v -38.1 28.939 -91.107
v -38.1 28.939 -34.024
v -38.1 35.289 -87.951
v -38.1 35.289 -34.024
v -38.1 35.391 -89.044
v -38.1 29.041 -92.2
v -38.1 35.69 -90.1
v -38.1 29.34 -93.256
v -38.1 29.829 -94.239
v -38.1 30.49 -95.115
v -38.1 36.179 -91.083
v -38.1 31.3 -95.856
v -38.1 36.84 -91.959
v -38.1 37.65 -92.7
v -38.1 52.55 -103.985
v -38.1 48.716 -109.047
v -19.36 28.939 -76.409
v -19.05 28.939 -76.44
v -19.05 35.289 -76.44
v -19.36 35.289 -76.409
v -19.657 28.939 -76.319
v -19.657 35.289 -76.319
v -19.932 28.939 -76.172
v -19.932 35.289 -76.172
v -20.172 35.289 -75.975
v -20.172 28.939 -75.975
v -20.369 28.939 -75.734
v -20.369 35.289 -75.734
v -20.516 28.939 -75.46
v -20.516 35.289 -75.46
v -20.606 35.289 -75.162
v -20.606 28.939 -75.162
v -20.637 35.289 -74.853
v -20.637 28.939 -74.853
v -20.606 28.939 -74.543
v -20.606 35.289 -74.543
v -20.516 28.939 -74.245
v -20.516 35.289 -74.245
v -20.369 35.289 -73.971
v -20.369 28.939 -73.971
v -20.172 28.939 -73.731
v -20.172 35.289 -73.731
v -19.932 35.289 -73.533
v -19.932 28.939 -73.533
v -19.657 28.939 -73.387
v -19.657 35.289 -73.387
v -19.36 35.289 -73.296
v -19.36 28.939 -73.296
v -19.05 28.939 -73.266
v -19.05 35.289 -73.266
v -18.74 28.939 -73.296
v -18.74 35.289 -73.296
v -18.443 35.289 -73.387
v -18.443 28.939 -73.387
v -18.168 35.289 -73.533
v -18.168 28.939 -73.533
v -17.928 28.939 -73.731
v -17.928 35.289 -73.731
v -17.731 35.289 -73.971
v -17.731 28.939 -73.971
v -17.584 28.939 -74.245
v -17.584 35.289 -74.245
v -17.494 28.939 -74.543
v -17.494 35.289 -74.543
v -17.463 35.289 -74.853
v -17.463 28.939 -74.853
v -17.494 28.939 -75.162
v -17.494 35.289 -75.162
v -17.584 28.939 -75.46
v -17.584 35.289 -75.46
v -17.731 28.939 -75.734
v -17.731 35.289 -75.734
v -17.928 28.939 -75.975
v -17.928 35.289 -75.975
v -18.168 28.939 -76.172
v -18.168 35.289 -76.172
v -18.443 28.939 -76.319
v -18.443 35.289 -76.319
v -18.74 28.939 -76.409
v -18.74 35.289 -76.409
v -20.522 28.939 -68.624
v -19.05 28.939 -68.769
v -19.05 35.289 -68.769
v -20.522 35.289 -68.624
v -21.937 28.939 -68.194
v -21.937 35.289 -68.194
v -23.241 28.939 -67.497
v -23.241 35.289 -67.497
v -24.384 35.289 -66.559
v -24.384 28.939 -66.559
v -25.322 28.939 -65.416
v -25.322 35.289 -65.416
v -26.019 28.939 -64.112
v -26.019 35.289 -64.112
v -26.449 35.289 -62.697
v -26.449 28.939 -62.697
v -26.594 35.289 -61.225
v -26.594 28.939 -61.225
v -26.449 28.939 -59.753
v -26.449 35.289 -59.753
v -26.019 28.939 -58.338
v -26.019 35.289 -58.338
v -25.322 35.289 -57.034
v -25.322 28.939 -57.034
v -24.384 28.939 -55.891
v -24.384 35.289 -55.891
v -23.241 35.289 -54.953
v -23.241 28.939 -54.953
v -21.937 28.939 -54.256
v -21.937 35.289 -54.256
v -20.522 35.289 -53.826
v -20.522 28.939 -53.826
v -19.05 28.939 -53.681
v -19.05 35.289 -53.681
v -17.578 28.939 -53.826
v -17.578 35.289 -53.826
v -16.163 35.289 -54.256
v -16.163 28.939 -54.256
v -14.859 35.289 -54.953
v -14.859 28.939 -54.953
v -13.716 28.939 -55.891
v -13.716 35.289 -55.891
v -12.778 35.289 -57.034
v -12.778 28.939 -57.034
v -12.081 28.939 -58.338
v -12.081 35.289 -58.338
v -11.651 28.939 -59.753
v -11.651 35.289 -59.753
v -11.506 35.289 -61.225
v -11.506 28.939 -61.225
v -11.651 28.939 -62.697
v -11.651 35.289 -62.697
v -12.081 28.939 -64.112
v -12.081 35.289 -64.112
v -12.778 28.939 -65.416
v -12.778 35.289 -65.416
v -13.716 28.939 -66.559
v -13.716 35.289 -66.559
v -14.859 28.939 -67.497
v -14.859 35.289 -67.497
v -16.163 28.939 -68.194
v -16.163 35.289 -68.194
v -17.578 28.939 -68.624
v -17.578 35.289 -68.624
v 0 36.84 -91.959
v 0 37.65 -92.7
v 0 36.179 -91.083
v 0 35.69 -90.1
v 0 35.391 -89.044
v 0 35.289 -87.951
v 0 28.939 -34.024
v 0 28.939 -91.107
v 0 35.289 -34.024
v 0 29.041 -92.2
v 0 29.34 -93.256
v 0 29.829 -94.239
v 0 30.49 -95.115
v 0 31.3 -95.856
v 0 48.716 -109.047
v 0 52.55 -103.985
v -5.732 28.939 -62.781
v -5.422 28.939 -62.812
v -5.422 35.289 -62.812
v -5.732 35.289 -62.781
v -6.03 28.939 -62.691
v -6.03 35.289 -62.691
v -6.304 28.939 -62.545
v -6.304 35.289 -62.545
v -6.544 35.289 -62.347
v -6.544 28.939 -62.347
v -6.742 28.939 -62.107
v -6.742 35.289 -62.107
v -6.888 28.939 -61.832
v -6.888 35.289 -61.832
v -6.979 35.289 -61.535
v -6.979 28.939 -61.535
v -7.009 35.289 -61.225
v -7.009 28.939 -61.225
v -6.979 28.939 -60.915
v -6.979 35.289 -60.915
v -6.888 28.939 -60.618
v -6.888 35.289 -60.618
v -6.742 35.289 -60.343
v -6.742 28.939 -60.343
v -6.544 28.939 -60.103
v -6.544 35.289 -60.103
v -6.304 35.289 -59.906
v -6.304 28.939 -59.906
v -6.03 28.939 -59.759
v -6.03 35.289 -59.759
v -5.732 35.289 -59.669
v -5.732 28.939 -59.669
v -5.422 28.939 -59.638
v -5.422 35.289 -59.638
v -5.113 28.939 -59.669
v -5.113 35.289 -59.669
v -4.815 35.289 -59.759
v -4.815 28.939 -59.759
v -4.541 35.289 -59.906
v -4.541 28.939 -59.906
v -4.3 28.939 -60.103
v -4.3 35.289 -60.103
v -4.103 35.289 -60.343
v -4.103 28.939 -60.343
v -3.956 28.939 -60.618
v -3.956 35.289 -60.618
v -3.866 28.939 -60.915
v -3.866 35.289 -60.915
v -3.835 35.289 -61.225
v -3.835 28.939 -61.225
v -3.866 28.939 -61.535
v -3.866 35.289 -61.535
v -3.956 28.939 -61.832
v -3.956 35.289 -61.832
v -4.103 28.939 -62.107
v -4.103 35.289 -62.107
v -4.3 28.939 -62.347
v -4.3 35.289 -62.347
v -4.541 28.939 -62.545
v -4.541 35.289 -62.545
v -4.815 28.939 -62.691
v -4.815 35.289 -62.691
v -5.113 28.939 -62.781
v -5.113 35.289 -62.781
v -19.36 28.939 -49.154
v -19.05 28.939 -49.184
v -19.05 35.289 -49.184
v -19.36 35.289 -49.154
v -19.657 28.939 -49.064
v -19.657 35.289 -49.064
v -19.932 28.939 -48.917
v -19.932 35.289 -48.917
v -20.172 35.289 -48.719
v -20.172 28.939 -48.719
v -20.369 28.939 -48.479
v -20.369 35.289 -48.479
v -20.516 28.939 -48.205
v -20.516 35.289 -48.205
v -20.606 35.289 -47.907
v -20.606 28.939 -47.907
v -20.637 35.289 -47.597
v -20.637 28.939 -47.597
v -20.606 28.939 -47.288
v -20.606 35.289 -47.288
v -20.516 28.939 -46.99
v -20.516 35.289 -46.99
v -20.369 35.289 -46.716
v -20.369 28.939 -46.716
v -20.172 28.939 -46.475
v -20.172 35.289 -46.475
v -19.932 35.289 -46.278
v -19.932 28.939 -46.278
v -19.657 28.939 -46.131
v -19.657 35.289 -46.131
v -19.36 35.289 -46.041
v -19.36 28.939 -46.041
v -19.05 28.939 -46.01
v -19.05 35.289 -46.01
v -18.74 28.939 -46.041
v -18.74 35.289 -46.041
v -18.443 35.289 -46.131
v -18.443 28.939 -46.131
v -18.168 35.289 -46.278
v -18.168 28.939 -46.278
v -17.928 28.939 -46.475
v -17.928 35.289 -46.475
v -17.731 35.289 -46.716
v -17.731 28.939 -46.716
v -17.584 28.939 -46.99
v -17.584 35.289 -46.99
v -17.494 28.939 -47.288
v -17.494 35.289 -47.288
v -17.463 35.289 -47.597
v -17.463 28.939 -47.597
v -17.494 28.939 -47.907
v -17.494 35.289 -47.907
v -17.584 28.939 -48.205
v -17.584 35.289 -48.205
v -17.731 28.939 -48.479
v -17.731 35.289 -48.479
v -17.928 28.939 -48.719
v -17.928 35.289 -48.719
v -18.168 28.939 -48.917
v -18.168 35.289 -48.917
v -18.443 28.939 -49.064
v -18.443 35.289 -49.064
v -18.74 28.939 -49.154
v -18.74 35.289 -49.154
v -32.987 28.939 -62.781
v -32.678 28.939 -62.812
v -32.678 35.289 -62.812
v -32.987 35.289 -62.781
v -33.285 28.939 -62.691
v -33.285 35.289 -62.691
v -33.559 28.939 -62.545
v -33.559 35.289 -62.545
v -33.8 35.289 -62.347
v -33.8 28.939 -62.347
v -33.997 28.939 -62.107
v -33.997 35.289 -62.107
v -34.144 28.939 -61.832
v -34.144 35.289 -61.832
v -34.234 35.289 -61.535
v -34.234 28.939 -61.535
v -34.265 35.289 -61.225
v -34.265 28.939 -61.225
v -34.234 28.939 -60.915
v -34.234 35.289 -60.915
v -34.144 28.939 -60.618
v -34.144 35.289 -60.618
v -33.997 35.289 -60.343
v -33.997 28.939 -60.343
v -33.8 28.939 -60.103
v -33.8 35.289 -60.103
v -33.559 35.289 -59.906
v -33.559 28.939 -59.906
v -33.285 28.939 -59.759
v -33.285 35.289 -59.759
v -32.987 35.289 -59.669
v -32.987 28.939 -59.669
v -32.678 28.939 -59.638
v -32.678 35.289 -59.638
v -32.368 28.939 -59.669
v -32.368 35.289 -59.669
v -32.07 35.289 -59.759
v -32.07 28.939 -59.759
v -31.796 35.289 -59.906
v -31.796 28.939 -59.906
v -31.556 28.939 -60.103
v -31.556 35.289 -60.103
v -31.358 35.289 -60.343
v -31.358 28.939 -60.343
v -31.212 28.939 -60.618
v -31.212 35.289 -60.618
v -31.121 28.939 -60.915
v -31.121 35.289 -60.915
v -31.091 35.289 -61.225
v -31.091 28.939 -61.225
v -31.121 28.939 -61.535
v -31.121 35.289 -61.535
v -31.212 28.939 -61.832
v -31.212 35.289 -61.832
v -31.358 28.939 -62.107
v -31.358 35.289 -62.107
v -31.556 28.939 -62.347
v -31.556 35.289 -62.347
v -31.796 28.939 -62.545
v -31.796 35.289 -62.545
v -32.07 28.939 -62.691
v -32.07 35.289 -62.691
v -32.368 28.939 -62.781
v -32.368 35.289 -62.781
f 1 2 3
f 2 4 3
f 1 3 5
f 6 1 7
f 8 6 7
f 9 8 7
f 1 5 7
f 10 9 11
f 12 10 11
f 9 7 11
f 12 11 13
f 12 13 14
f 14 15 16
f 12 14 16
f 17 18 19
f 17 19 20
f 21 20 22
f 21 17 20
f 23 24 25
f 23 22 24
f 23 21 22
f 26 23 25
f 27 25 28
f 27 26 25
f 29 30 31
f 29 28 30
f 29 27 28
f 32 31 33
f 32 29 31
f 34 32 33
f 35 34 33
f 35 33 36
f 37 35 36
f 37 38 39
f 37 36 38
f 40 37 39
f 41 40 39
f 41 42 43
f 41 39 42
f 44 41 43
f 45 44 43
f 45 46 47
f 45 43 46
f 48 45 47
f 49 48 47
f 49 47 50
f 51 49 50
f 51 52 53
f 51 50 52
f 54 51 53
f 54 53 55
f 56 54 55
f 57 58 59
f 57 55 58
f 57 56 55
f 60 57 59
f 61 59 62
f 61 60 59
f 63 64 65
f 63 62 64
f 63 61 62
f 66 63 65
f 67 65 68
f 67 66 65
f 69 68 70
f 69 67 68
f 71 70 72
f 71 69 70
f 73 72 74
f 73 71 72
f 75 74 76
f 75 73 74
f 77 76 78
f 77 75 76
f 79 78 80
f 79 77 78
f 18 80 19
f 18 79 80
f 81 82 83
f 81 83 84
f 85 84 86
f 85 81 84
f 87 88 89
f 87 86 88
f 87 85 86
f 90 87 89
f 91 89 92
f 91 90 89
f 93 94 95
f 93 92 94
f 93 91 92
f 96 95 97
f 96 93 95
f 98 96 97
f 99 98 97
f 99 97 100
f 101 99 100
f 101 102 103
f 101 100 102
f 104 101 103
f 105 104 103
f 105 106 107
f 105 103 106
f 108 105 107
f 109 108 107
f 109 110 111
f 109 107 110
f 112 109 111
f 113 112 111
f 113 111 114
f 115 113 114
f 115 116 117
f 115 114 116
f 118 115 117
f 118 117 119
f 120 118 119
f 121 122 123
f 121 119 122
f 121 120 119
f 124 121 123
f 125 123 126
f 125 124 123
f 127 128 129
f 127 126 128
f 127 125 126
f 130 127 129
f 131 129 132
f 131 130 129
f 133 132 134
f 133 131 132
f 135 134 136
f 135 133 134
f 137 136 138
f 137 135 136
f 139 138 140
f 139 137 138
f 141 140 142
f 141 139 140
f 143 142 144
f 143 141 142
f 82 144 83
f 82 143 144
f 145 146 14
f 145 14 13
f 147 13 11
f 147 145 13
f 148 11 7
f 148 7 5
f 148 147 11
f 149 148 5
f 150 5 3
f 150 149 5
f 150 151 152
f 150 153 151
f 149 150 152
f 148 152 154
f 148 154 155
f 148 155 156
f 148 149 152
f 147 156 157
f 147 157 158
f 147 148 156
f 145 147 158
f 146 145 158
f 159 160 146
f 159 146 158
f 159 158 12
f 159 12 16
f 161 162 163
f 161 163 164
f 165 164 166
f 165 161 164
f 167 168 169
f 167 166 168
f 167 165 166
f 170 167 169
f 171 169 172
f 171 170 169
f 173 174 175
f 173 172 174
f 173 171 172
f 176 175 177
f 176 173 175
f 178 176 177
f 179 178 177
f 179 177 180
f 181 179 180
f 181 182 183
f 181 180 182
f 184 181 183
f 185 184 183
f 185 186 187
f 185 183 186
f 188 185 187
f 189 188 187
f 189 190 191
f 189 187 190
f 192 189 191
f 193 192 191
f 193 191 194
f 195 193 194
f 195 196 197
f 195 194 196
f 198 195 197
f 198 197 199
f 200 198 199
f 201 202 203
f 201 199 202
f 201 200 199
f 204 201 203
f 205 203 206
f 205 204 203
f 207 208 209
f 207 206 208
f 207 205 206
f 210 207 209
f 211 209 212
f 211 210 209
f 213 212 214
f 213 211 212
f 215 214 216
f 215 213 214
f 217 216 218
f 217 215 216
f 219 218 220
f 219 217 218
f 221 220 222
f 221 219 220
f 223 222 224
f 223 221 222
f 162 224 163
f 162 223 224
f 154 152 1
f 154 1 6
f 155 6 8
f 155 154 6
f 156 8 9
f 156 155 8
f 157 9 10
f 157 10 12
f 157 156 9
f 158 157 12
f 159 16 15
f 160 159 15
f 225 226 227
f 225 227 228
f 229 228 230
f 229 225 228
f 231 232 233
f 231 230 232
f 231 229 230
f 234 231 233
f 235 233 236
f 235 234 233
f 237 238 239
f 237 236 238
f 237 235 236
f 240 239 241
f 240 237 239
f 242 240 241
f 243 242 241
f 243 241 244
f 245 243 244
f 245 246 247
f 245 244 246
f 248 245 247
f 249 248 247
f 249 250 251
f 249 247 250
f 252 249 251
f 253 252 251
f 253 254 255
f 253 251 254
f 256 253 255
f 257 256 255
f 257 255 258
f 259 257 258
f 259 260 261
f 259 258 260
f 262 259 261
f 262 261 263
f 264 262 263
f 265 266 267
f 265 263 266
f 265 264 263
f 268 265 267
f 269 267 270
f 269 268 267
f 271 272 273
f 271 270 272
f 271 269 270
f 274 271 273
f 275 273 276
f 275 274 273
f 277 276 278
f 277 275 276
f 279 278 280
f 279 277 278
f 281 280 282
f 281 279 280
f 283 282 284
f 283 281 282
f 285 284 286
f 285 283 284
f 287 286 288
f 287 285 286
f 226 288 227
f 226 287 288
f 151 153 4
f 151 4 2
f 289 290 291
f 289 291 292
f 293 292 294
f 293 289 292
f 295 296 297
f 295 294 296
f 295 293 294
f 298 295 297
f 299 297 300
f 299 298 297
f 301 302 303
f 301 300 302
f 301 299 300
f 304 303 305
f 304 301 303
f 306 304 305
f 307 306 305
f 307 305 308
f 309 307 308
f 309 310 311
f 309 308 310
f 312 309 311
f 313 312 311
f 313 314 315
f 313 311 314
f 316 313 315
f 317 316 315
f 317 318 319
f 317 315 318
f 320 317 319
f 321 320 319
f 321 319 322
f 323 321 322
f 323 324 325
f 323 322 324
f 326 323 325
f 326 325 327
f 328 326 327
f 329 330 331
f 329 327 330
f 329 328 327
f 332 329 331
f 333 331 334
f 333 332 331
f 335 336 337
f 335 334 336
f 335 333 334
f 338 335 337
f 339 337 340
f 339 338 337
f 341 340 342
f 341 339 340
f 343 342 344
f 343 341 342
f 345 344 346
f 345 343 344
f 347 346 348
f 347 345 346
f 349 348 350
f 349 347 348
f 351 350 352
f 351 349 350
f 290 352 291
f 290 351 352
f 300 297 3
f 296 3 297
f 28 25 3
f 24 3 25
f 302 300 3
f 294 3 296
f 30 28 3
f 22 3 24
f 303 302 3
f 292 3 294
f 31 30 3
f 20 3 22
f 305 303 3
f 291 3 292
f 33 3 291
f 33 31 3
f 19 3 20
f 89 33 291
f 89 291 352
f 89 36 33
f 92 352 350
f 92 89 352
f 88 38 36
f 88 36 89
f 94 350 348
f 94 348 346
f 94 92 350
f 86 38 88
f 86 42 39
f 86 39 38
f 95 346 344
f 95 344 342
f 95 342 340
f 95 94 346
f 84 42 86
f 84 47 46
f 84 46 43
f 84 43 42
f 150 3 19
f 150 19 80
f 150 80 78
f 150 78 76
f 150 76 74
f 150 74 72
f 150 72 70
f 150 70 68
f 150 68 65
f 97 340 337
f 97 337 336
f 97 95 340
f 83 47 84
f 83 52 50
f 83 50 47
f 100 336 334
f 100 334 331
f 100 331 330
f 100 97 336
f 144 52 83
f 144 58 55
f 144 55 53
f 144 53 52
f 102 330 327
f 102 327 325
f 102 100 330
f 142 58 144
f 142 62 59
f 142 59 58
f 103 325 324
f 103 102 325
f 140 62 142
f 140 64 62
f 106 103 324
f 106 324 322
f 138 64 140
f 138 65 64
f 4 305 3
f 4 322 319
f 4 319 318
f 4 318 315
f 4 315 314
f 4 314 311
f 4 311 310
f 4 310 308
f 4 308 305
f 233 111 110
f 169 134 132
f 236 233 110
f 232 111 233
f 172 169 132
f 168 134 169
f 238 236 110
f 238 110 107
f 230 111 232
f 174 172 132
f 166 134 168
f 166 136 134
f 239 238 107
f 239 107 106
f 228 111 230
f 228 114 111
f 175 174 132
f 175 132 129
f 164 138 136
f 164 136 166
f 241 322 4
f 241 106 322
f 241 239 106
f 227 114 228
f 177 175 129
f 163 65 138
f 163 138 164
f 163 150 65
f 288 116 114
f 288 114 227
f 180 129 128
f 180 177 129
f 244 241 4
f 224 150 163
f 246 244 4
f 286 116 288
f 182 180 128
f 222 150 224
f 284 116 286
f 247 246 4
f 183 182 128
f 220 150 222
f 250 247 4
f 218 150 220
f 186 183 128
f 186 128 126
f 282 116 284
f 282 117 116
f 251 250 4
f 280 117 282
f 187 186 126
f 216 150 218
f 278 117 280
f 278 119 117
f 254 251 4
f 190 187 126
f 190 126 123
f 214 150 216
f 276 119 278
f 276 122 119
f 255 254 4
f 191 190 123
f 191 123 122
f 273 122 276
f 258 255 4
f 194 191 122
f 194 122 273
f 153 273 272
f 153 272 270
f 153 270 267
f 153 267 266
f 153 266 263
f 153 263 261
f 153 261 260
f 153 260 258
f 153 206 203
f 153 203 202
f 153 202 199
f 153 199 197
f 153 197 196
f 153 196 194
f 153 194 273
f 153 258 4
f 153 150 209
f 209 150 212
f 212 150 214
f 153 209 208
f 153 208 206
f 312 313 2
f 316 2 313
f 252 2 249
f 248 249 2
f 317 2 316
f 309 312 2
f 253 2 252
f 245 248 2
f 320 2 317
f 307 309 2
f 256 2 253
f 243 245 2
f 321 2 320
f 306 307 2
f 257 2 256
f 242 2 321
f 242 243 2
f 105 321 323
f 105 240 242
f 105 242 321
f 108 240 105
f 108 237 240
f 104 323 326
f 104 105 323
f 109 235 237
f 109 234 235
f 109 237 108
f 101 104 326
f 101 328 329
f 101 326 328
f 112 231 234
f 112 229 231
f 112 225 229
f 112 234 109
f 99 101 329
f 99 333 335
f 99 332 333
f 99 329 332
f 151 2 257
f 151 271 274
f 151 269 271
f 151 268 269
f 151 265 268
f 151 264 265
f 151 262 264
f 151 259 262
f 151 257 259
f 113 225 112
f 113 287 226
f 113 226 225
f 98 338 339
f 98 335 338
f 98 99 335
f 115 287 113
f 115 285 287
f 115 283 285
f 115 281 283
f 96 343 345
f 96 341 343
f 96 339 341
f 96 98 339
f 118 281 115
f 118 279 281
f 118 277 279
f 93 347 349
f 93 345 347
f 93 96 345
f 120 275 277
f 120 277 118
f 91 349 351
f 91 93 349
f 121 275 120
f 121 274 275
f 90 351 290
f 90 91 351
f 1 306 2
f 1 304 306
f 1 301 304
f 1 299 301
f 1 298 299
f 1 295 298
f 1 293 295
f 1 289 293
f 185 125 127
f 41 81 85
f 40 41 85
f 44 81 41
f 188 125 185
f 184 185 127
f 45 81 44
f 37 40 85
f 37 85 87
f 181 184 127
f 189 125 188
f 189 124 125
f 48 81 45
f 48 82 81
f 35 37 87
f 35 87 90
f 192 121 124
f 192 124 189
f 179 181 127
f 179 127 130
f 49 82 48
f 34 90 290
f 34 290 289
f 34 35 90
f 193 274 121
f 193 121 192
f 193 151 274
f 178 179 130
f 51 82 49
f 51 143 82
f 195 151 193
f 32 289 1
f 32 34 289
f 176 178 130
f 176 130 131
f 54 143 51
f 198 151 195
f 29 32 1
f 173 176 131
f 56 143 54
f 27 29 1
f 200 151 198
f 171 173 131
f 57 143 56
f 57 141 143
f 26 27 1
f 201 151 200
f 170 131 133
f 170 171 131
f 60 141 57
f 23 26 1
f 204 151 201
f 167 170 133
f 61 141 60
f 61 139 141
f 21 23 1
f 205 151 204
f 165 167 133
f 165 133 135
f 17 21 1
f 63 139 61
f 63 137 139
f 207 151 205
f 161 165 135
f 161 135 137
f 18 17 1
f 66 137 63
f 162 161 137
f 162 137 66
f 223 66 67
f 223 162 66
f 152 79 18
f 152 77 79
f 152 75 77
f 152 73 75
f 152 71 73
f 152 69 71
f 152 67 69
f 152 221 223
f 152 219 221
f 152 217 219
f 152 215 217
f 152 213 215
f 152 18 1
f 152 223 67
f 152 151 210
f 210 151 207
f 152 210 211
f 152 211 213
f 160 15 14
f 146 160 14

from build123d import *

# Parameters (mm, degrees)
EXTRUDE1_DEPTH = 38.1
SKETCH2_R      = 7.543563031
SKETCH2_R_2    = 1.586948076
EXTRUDE2_DEPTH = 38.1


with BuildPart() as part:
    # Sketch1 → Extrude1 (new body)
    with BuildSketch(Plane(origin=(0, 0, 0), x_dir=(0, 0, -1), z_dir=(1, 0, 0))):
        with BuildLine():
            Line((34.023739696, 28.939470853), (91.107488572, 28.939470853))
            ThreePointArc((91.107488572, 28.939470853), (93.758821762, 29.562065849), (95.855917312, 31.299702884))
            Line((95.855917312, 31.299702884), (109.047015974, 48.716075337))
            Line((109.047015974, 48.716075337), (103.985043986, 52.54999495))
            Line((103.985043986, 52.54999495), (92.699615676, 37.649702884))
            ThreePointArc((92.699615676, 37.649702884), (90.602520127, 35.912065849), (87.951186937, 35.289470853))
            Line((87.951186937, 35.289470853), (34.023739696, 35.289470853))
            Line((34.023739696, 35.289470853), (34.023739696, 28.939470853))
        make_face()
    extrude(amount=-EXTRUDE1_DEPTH)

    # Sketch2 → Extrude2 (cut)
    with BuildSketch(Plane(origin=(0, 0, 0), x_dir=(1, 0, 0), z_dir=(0, 1, 0))):
        with Locations(Location((-19.05, 61.225007573, 0), (0, 0, 90))):
            Circle(SKETCH2_R)
        with Locations(Location((-32.67765431, 61.225007573, 0), (0, 0, 90))):
            Circle(SKETCH2_R_2)
        with Locations(Location((-19.05, 74.852661883, 0), (0, 0, 90))):
            Circle(SKETCH2_R_2)
        with Locations(Location((-5.42234569, 61.225007573, 0), (0, 0, 90))):
            Circle(SKETCH2_R_2)
        with Locations(Location((-19.05, 47.597353263, 0), (0, 0, 90))):
            Circle(SKETCH2_R_2)
    extrude(amount=EXTRUDE2_DEPTH, mode=Mode.SUBTRACT)


solid = part.part
